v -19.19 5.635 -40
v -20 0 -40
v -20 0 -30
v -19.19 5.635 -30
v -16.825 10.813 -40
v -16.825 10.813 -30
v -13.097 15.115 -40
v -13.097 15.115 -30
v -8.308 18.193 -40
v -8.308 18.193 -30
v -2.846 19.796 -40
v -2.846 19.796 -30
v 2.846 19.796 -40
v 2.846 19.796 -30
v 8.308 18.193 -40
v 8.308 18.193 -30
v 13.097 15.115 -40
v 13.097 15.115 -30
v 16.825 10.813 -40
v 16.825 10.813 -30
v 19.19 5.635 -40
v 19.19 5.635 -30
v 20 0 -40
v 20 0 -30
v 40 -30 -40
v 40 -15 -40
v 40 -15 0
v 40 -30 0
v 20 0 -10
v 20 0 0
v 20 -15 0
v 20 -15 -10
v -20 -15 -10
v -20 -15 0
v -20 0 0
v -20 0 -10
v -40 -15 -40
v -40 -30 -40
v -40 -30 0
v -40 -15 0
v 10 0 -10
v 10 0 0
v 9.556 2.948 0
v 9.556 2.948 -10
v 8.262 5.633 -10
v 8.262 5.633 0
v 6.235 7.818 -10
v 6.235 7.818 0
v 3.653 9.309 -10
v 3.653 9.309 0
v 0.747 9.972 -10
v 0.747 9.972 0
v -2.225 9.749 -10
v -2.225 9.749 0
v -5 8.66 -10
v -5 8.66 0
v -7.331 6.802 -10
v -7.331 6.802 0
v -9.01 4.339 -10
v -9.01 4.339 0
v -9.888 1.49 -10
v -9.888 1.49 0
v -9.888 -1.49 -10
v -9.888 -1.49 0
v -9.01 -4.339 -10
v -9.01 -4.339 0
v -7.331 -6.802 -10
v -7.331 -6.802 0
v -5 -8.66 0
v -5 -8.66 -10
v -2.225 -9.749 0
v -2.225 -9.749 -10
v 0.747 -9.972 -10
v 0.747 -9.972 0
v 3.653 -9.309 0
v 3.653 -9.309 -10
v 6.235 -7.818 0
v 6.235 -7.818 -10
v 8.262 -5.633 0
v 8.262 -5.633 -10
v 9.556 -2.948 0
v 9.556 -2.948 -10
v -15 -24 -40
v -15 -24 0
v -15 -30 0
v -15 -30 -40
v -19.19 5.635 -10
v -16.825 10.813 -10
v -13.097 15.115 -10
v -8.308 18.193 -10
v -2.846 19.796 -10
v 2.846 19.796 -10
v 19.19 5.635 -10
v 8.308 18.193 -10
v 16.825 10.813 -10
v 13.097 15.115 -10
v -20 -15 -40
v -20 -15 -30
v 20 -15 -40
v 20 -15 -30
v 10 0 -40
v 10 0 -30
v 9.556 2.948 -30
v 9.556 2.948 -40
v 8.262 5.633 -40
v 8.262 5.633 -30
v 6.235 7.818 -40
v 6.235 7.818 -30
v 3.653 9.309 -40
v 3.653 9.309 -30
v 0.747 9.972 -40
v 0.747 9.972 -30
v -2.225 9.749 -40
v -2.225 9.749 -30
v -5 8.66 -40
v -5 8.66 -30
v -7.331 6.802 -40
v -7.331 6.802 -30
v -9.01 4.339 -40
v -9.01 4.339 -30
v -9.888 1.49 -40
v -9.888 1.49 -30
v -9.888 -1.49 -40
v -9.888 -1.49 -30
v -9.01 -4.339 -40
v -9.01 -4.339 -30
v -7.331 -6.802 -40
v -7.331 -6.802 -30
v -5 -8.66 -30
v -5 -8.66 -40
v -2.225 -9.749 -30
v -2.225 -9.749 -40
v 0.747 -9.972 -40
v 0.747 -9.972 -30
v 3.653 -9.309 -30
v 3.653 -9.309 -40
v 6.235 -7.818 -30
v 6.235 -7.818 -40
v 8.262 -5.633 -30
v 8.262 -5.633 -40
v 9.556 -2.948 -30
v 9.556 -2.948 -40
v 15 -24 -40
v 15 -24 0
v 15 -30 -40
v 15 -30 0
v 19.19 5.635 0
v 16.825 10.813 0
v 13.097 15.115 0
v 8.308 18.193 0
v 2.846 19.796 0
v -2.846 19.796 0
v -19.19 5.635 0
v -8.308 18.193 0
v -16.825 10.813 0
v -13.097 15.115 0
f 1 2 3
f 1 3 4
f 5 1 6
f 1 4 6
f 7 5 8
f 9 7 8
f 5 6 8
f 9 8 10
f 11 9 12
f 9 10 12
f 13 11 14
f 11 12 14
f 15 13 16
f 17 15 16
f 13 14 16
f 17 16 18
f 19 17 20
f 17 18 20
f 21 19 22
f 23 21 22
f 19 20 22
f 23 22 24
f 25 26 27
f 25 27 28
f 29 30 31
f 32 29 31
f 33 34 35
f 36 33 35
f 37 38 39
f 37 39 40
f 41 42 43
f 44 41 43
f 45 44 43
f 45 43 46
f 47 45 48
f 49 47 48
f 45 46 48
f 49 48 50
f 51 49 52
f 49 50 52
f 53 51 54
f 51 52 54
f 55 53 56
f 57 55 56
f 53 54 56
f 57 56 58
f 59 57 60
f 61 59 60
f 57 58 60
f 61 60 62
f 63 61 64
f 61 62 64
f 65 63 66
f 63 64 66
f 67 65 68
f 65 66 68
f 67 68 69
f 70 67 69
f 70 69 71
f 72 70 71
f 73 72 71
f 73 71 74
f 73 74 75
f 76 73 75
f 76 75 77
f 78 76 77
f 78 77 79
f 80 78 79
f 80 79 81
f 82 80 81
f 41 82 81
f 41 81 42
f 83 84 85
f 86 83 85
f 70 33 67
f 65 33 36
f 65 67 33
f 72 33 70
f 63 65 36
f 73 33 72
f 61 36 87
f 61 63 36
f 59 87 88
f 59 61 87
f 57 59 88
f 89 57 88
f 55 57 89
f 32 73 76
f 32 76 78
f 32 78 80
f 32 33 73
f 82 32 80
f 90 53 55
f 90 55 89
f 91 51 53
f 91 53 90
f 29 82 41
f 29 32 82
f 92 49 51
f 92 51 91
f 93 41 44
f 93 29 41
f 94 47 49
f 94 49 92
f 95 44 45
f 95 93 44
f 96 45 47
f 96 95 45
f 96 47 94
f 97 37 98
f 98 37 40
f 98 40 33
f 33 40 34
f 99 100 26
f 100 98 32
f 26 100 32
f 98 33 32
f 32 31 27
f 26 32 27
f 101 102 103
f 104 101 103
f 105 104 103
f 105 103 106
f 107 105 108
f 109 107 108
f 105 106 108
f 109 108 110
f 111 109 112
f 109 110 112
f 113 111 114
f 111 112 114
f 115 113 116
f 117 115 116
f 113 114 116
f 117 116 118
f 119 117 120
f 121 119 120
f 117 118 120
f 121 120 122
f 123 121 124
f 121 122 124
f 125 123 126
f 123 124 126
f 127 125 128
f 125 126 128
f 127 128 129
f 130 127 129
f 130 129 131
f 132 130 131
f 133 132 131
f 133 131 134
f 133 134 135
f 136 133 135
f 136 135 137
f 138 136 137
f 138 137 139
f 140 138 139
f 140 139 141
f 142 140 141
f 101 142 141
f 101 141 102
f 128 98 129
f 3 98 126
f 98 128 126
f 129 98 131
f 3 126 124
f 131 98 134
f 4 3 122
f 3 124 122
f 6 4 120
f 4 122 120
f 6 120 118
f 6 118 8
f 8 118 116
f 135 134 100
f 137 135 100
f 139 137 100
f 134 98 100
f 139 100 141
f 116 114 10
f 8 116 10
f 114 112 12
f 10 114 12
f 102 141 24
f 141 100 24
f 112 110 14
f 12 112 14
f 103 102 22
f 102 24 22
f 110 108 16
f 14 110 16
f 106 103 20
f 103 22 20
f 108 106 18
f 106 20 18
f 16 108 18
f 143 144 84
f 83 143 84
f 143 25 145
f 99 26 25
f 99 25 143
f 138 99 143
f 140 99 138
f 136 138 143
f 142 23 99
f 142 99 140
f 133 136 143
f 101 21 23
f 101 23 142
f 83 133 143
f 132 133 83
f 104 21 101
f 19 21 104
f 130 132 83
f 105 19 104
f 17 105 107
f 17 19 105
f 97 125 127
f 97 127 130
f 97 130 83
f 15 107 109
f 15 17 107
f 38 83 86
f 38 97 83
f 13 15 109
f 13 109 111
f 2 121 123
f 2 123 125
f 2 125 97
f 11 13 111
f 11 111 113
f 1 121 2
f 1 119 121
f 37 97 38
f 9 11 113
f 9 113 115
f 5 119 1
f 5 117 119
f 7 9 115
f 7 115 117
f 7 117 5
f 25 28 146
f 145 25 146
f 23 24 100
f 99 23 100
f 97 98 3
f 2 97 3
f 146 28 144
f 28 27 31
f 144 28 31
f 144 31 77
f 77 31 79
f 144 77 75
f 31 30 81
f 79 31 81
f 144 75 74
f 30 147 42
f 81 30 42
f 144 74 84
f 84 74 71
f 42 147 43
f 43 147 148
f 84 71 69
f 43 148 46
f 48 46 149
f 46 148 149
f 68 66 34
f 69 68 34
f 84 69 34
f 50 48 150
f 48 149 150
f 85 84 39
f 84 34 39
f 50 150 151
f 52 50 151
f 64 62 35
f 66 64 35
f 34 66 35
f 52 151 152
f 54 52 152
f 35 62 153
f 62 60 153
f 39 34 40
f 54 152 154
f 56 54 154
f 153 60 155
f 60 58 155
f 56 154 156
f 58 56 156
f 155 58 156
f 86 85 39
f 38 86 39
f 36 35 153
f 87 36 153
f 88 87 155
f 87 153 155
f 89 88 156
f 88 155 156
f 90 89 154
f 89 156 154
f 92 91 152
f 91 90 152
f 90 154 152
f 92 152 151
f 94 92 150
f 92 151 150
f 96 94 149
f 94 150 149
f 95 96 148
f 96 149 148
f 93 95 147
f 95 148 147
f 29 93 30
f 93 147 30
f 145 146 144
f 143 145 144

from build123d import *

# Parameters (mm, degrees)
ESBO_O1_R                  = 10
RESSALTO_EXTRUS_O1_DEPTH   = 40
CORTE_EXTRUS_O1_DEPTH      = 79.102496759
CORTE_EXTRUS_O1_DEPTH_BACK = 79.102496759
ESBO_O2_W                  = 20
ESBO_O2_H                  = 35


with BuildPart() as part:
    # Esboço1 → Ressalto-extrusão1 (new body)
    with BuildSketch(Plane.XY):
        with BuildLine():
            Line((15, -30), (15, -24))
            Line((15, -24), (-15, -24))
            Line((-15, -24), (-15, -30))
            Line((-15, -30), (-40, -30))
            Line((-40, -30), (-40, -15))
            Line((-40, -15), (-20, -15))
            Line((-20, -15), (-20, 0))
            ThreePointArc((-20, 0), (0, 20), (20, 0))
            Line((20, 0), (20, -15))
            Line((20, -15), (40, -15))
            Line((40, -15), (40, -30))
            Line((40, -30), (15, -30))
        make_face()
        Circle(ESBO_O1_R, mode=Mode.SUBTRACT)
    extrude(amount=-RESSALTO_EXTRUS_O1_DEPTH)

    # Esboço2 → Corte-extrusão1 (cut, two sides: drawn at the far end of the back side and taken through both)
    with BuildSketch(Plane.ZY.offset(20).offset(-CORTE_EXTRUS_O1_DEPTH_BACK)):
        with Locations((-20, 2.5)):
            Rectangle(ESBO_O2_W, ESBO_O2_H)
    extrude(amount=CORTE_EXTRUS_O1_DEPTH + CORTE_EXTRUS_O1_DEPTH_BACK, mode=Mode.SUBTRACT)


solid = part.part
